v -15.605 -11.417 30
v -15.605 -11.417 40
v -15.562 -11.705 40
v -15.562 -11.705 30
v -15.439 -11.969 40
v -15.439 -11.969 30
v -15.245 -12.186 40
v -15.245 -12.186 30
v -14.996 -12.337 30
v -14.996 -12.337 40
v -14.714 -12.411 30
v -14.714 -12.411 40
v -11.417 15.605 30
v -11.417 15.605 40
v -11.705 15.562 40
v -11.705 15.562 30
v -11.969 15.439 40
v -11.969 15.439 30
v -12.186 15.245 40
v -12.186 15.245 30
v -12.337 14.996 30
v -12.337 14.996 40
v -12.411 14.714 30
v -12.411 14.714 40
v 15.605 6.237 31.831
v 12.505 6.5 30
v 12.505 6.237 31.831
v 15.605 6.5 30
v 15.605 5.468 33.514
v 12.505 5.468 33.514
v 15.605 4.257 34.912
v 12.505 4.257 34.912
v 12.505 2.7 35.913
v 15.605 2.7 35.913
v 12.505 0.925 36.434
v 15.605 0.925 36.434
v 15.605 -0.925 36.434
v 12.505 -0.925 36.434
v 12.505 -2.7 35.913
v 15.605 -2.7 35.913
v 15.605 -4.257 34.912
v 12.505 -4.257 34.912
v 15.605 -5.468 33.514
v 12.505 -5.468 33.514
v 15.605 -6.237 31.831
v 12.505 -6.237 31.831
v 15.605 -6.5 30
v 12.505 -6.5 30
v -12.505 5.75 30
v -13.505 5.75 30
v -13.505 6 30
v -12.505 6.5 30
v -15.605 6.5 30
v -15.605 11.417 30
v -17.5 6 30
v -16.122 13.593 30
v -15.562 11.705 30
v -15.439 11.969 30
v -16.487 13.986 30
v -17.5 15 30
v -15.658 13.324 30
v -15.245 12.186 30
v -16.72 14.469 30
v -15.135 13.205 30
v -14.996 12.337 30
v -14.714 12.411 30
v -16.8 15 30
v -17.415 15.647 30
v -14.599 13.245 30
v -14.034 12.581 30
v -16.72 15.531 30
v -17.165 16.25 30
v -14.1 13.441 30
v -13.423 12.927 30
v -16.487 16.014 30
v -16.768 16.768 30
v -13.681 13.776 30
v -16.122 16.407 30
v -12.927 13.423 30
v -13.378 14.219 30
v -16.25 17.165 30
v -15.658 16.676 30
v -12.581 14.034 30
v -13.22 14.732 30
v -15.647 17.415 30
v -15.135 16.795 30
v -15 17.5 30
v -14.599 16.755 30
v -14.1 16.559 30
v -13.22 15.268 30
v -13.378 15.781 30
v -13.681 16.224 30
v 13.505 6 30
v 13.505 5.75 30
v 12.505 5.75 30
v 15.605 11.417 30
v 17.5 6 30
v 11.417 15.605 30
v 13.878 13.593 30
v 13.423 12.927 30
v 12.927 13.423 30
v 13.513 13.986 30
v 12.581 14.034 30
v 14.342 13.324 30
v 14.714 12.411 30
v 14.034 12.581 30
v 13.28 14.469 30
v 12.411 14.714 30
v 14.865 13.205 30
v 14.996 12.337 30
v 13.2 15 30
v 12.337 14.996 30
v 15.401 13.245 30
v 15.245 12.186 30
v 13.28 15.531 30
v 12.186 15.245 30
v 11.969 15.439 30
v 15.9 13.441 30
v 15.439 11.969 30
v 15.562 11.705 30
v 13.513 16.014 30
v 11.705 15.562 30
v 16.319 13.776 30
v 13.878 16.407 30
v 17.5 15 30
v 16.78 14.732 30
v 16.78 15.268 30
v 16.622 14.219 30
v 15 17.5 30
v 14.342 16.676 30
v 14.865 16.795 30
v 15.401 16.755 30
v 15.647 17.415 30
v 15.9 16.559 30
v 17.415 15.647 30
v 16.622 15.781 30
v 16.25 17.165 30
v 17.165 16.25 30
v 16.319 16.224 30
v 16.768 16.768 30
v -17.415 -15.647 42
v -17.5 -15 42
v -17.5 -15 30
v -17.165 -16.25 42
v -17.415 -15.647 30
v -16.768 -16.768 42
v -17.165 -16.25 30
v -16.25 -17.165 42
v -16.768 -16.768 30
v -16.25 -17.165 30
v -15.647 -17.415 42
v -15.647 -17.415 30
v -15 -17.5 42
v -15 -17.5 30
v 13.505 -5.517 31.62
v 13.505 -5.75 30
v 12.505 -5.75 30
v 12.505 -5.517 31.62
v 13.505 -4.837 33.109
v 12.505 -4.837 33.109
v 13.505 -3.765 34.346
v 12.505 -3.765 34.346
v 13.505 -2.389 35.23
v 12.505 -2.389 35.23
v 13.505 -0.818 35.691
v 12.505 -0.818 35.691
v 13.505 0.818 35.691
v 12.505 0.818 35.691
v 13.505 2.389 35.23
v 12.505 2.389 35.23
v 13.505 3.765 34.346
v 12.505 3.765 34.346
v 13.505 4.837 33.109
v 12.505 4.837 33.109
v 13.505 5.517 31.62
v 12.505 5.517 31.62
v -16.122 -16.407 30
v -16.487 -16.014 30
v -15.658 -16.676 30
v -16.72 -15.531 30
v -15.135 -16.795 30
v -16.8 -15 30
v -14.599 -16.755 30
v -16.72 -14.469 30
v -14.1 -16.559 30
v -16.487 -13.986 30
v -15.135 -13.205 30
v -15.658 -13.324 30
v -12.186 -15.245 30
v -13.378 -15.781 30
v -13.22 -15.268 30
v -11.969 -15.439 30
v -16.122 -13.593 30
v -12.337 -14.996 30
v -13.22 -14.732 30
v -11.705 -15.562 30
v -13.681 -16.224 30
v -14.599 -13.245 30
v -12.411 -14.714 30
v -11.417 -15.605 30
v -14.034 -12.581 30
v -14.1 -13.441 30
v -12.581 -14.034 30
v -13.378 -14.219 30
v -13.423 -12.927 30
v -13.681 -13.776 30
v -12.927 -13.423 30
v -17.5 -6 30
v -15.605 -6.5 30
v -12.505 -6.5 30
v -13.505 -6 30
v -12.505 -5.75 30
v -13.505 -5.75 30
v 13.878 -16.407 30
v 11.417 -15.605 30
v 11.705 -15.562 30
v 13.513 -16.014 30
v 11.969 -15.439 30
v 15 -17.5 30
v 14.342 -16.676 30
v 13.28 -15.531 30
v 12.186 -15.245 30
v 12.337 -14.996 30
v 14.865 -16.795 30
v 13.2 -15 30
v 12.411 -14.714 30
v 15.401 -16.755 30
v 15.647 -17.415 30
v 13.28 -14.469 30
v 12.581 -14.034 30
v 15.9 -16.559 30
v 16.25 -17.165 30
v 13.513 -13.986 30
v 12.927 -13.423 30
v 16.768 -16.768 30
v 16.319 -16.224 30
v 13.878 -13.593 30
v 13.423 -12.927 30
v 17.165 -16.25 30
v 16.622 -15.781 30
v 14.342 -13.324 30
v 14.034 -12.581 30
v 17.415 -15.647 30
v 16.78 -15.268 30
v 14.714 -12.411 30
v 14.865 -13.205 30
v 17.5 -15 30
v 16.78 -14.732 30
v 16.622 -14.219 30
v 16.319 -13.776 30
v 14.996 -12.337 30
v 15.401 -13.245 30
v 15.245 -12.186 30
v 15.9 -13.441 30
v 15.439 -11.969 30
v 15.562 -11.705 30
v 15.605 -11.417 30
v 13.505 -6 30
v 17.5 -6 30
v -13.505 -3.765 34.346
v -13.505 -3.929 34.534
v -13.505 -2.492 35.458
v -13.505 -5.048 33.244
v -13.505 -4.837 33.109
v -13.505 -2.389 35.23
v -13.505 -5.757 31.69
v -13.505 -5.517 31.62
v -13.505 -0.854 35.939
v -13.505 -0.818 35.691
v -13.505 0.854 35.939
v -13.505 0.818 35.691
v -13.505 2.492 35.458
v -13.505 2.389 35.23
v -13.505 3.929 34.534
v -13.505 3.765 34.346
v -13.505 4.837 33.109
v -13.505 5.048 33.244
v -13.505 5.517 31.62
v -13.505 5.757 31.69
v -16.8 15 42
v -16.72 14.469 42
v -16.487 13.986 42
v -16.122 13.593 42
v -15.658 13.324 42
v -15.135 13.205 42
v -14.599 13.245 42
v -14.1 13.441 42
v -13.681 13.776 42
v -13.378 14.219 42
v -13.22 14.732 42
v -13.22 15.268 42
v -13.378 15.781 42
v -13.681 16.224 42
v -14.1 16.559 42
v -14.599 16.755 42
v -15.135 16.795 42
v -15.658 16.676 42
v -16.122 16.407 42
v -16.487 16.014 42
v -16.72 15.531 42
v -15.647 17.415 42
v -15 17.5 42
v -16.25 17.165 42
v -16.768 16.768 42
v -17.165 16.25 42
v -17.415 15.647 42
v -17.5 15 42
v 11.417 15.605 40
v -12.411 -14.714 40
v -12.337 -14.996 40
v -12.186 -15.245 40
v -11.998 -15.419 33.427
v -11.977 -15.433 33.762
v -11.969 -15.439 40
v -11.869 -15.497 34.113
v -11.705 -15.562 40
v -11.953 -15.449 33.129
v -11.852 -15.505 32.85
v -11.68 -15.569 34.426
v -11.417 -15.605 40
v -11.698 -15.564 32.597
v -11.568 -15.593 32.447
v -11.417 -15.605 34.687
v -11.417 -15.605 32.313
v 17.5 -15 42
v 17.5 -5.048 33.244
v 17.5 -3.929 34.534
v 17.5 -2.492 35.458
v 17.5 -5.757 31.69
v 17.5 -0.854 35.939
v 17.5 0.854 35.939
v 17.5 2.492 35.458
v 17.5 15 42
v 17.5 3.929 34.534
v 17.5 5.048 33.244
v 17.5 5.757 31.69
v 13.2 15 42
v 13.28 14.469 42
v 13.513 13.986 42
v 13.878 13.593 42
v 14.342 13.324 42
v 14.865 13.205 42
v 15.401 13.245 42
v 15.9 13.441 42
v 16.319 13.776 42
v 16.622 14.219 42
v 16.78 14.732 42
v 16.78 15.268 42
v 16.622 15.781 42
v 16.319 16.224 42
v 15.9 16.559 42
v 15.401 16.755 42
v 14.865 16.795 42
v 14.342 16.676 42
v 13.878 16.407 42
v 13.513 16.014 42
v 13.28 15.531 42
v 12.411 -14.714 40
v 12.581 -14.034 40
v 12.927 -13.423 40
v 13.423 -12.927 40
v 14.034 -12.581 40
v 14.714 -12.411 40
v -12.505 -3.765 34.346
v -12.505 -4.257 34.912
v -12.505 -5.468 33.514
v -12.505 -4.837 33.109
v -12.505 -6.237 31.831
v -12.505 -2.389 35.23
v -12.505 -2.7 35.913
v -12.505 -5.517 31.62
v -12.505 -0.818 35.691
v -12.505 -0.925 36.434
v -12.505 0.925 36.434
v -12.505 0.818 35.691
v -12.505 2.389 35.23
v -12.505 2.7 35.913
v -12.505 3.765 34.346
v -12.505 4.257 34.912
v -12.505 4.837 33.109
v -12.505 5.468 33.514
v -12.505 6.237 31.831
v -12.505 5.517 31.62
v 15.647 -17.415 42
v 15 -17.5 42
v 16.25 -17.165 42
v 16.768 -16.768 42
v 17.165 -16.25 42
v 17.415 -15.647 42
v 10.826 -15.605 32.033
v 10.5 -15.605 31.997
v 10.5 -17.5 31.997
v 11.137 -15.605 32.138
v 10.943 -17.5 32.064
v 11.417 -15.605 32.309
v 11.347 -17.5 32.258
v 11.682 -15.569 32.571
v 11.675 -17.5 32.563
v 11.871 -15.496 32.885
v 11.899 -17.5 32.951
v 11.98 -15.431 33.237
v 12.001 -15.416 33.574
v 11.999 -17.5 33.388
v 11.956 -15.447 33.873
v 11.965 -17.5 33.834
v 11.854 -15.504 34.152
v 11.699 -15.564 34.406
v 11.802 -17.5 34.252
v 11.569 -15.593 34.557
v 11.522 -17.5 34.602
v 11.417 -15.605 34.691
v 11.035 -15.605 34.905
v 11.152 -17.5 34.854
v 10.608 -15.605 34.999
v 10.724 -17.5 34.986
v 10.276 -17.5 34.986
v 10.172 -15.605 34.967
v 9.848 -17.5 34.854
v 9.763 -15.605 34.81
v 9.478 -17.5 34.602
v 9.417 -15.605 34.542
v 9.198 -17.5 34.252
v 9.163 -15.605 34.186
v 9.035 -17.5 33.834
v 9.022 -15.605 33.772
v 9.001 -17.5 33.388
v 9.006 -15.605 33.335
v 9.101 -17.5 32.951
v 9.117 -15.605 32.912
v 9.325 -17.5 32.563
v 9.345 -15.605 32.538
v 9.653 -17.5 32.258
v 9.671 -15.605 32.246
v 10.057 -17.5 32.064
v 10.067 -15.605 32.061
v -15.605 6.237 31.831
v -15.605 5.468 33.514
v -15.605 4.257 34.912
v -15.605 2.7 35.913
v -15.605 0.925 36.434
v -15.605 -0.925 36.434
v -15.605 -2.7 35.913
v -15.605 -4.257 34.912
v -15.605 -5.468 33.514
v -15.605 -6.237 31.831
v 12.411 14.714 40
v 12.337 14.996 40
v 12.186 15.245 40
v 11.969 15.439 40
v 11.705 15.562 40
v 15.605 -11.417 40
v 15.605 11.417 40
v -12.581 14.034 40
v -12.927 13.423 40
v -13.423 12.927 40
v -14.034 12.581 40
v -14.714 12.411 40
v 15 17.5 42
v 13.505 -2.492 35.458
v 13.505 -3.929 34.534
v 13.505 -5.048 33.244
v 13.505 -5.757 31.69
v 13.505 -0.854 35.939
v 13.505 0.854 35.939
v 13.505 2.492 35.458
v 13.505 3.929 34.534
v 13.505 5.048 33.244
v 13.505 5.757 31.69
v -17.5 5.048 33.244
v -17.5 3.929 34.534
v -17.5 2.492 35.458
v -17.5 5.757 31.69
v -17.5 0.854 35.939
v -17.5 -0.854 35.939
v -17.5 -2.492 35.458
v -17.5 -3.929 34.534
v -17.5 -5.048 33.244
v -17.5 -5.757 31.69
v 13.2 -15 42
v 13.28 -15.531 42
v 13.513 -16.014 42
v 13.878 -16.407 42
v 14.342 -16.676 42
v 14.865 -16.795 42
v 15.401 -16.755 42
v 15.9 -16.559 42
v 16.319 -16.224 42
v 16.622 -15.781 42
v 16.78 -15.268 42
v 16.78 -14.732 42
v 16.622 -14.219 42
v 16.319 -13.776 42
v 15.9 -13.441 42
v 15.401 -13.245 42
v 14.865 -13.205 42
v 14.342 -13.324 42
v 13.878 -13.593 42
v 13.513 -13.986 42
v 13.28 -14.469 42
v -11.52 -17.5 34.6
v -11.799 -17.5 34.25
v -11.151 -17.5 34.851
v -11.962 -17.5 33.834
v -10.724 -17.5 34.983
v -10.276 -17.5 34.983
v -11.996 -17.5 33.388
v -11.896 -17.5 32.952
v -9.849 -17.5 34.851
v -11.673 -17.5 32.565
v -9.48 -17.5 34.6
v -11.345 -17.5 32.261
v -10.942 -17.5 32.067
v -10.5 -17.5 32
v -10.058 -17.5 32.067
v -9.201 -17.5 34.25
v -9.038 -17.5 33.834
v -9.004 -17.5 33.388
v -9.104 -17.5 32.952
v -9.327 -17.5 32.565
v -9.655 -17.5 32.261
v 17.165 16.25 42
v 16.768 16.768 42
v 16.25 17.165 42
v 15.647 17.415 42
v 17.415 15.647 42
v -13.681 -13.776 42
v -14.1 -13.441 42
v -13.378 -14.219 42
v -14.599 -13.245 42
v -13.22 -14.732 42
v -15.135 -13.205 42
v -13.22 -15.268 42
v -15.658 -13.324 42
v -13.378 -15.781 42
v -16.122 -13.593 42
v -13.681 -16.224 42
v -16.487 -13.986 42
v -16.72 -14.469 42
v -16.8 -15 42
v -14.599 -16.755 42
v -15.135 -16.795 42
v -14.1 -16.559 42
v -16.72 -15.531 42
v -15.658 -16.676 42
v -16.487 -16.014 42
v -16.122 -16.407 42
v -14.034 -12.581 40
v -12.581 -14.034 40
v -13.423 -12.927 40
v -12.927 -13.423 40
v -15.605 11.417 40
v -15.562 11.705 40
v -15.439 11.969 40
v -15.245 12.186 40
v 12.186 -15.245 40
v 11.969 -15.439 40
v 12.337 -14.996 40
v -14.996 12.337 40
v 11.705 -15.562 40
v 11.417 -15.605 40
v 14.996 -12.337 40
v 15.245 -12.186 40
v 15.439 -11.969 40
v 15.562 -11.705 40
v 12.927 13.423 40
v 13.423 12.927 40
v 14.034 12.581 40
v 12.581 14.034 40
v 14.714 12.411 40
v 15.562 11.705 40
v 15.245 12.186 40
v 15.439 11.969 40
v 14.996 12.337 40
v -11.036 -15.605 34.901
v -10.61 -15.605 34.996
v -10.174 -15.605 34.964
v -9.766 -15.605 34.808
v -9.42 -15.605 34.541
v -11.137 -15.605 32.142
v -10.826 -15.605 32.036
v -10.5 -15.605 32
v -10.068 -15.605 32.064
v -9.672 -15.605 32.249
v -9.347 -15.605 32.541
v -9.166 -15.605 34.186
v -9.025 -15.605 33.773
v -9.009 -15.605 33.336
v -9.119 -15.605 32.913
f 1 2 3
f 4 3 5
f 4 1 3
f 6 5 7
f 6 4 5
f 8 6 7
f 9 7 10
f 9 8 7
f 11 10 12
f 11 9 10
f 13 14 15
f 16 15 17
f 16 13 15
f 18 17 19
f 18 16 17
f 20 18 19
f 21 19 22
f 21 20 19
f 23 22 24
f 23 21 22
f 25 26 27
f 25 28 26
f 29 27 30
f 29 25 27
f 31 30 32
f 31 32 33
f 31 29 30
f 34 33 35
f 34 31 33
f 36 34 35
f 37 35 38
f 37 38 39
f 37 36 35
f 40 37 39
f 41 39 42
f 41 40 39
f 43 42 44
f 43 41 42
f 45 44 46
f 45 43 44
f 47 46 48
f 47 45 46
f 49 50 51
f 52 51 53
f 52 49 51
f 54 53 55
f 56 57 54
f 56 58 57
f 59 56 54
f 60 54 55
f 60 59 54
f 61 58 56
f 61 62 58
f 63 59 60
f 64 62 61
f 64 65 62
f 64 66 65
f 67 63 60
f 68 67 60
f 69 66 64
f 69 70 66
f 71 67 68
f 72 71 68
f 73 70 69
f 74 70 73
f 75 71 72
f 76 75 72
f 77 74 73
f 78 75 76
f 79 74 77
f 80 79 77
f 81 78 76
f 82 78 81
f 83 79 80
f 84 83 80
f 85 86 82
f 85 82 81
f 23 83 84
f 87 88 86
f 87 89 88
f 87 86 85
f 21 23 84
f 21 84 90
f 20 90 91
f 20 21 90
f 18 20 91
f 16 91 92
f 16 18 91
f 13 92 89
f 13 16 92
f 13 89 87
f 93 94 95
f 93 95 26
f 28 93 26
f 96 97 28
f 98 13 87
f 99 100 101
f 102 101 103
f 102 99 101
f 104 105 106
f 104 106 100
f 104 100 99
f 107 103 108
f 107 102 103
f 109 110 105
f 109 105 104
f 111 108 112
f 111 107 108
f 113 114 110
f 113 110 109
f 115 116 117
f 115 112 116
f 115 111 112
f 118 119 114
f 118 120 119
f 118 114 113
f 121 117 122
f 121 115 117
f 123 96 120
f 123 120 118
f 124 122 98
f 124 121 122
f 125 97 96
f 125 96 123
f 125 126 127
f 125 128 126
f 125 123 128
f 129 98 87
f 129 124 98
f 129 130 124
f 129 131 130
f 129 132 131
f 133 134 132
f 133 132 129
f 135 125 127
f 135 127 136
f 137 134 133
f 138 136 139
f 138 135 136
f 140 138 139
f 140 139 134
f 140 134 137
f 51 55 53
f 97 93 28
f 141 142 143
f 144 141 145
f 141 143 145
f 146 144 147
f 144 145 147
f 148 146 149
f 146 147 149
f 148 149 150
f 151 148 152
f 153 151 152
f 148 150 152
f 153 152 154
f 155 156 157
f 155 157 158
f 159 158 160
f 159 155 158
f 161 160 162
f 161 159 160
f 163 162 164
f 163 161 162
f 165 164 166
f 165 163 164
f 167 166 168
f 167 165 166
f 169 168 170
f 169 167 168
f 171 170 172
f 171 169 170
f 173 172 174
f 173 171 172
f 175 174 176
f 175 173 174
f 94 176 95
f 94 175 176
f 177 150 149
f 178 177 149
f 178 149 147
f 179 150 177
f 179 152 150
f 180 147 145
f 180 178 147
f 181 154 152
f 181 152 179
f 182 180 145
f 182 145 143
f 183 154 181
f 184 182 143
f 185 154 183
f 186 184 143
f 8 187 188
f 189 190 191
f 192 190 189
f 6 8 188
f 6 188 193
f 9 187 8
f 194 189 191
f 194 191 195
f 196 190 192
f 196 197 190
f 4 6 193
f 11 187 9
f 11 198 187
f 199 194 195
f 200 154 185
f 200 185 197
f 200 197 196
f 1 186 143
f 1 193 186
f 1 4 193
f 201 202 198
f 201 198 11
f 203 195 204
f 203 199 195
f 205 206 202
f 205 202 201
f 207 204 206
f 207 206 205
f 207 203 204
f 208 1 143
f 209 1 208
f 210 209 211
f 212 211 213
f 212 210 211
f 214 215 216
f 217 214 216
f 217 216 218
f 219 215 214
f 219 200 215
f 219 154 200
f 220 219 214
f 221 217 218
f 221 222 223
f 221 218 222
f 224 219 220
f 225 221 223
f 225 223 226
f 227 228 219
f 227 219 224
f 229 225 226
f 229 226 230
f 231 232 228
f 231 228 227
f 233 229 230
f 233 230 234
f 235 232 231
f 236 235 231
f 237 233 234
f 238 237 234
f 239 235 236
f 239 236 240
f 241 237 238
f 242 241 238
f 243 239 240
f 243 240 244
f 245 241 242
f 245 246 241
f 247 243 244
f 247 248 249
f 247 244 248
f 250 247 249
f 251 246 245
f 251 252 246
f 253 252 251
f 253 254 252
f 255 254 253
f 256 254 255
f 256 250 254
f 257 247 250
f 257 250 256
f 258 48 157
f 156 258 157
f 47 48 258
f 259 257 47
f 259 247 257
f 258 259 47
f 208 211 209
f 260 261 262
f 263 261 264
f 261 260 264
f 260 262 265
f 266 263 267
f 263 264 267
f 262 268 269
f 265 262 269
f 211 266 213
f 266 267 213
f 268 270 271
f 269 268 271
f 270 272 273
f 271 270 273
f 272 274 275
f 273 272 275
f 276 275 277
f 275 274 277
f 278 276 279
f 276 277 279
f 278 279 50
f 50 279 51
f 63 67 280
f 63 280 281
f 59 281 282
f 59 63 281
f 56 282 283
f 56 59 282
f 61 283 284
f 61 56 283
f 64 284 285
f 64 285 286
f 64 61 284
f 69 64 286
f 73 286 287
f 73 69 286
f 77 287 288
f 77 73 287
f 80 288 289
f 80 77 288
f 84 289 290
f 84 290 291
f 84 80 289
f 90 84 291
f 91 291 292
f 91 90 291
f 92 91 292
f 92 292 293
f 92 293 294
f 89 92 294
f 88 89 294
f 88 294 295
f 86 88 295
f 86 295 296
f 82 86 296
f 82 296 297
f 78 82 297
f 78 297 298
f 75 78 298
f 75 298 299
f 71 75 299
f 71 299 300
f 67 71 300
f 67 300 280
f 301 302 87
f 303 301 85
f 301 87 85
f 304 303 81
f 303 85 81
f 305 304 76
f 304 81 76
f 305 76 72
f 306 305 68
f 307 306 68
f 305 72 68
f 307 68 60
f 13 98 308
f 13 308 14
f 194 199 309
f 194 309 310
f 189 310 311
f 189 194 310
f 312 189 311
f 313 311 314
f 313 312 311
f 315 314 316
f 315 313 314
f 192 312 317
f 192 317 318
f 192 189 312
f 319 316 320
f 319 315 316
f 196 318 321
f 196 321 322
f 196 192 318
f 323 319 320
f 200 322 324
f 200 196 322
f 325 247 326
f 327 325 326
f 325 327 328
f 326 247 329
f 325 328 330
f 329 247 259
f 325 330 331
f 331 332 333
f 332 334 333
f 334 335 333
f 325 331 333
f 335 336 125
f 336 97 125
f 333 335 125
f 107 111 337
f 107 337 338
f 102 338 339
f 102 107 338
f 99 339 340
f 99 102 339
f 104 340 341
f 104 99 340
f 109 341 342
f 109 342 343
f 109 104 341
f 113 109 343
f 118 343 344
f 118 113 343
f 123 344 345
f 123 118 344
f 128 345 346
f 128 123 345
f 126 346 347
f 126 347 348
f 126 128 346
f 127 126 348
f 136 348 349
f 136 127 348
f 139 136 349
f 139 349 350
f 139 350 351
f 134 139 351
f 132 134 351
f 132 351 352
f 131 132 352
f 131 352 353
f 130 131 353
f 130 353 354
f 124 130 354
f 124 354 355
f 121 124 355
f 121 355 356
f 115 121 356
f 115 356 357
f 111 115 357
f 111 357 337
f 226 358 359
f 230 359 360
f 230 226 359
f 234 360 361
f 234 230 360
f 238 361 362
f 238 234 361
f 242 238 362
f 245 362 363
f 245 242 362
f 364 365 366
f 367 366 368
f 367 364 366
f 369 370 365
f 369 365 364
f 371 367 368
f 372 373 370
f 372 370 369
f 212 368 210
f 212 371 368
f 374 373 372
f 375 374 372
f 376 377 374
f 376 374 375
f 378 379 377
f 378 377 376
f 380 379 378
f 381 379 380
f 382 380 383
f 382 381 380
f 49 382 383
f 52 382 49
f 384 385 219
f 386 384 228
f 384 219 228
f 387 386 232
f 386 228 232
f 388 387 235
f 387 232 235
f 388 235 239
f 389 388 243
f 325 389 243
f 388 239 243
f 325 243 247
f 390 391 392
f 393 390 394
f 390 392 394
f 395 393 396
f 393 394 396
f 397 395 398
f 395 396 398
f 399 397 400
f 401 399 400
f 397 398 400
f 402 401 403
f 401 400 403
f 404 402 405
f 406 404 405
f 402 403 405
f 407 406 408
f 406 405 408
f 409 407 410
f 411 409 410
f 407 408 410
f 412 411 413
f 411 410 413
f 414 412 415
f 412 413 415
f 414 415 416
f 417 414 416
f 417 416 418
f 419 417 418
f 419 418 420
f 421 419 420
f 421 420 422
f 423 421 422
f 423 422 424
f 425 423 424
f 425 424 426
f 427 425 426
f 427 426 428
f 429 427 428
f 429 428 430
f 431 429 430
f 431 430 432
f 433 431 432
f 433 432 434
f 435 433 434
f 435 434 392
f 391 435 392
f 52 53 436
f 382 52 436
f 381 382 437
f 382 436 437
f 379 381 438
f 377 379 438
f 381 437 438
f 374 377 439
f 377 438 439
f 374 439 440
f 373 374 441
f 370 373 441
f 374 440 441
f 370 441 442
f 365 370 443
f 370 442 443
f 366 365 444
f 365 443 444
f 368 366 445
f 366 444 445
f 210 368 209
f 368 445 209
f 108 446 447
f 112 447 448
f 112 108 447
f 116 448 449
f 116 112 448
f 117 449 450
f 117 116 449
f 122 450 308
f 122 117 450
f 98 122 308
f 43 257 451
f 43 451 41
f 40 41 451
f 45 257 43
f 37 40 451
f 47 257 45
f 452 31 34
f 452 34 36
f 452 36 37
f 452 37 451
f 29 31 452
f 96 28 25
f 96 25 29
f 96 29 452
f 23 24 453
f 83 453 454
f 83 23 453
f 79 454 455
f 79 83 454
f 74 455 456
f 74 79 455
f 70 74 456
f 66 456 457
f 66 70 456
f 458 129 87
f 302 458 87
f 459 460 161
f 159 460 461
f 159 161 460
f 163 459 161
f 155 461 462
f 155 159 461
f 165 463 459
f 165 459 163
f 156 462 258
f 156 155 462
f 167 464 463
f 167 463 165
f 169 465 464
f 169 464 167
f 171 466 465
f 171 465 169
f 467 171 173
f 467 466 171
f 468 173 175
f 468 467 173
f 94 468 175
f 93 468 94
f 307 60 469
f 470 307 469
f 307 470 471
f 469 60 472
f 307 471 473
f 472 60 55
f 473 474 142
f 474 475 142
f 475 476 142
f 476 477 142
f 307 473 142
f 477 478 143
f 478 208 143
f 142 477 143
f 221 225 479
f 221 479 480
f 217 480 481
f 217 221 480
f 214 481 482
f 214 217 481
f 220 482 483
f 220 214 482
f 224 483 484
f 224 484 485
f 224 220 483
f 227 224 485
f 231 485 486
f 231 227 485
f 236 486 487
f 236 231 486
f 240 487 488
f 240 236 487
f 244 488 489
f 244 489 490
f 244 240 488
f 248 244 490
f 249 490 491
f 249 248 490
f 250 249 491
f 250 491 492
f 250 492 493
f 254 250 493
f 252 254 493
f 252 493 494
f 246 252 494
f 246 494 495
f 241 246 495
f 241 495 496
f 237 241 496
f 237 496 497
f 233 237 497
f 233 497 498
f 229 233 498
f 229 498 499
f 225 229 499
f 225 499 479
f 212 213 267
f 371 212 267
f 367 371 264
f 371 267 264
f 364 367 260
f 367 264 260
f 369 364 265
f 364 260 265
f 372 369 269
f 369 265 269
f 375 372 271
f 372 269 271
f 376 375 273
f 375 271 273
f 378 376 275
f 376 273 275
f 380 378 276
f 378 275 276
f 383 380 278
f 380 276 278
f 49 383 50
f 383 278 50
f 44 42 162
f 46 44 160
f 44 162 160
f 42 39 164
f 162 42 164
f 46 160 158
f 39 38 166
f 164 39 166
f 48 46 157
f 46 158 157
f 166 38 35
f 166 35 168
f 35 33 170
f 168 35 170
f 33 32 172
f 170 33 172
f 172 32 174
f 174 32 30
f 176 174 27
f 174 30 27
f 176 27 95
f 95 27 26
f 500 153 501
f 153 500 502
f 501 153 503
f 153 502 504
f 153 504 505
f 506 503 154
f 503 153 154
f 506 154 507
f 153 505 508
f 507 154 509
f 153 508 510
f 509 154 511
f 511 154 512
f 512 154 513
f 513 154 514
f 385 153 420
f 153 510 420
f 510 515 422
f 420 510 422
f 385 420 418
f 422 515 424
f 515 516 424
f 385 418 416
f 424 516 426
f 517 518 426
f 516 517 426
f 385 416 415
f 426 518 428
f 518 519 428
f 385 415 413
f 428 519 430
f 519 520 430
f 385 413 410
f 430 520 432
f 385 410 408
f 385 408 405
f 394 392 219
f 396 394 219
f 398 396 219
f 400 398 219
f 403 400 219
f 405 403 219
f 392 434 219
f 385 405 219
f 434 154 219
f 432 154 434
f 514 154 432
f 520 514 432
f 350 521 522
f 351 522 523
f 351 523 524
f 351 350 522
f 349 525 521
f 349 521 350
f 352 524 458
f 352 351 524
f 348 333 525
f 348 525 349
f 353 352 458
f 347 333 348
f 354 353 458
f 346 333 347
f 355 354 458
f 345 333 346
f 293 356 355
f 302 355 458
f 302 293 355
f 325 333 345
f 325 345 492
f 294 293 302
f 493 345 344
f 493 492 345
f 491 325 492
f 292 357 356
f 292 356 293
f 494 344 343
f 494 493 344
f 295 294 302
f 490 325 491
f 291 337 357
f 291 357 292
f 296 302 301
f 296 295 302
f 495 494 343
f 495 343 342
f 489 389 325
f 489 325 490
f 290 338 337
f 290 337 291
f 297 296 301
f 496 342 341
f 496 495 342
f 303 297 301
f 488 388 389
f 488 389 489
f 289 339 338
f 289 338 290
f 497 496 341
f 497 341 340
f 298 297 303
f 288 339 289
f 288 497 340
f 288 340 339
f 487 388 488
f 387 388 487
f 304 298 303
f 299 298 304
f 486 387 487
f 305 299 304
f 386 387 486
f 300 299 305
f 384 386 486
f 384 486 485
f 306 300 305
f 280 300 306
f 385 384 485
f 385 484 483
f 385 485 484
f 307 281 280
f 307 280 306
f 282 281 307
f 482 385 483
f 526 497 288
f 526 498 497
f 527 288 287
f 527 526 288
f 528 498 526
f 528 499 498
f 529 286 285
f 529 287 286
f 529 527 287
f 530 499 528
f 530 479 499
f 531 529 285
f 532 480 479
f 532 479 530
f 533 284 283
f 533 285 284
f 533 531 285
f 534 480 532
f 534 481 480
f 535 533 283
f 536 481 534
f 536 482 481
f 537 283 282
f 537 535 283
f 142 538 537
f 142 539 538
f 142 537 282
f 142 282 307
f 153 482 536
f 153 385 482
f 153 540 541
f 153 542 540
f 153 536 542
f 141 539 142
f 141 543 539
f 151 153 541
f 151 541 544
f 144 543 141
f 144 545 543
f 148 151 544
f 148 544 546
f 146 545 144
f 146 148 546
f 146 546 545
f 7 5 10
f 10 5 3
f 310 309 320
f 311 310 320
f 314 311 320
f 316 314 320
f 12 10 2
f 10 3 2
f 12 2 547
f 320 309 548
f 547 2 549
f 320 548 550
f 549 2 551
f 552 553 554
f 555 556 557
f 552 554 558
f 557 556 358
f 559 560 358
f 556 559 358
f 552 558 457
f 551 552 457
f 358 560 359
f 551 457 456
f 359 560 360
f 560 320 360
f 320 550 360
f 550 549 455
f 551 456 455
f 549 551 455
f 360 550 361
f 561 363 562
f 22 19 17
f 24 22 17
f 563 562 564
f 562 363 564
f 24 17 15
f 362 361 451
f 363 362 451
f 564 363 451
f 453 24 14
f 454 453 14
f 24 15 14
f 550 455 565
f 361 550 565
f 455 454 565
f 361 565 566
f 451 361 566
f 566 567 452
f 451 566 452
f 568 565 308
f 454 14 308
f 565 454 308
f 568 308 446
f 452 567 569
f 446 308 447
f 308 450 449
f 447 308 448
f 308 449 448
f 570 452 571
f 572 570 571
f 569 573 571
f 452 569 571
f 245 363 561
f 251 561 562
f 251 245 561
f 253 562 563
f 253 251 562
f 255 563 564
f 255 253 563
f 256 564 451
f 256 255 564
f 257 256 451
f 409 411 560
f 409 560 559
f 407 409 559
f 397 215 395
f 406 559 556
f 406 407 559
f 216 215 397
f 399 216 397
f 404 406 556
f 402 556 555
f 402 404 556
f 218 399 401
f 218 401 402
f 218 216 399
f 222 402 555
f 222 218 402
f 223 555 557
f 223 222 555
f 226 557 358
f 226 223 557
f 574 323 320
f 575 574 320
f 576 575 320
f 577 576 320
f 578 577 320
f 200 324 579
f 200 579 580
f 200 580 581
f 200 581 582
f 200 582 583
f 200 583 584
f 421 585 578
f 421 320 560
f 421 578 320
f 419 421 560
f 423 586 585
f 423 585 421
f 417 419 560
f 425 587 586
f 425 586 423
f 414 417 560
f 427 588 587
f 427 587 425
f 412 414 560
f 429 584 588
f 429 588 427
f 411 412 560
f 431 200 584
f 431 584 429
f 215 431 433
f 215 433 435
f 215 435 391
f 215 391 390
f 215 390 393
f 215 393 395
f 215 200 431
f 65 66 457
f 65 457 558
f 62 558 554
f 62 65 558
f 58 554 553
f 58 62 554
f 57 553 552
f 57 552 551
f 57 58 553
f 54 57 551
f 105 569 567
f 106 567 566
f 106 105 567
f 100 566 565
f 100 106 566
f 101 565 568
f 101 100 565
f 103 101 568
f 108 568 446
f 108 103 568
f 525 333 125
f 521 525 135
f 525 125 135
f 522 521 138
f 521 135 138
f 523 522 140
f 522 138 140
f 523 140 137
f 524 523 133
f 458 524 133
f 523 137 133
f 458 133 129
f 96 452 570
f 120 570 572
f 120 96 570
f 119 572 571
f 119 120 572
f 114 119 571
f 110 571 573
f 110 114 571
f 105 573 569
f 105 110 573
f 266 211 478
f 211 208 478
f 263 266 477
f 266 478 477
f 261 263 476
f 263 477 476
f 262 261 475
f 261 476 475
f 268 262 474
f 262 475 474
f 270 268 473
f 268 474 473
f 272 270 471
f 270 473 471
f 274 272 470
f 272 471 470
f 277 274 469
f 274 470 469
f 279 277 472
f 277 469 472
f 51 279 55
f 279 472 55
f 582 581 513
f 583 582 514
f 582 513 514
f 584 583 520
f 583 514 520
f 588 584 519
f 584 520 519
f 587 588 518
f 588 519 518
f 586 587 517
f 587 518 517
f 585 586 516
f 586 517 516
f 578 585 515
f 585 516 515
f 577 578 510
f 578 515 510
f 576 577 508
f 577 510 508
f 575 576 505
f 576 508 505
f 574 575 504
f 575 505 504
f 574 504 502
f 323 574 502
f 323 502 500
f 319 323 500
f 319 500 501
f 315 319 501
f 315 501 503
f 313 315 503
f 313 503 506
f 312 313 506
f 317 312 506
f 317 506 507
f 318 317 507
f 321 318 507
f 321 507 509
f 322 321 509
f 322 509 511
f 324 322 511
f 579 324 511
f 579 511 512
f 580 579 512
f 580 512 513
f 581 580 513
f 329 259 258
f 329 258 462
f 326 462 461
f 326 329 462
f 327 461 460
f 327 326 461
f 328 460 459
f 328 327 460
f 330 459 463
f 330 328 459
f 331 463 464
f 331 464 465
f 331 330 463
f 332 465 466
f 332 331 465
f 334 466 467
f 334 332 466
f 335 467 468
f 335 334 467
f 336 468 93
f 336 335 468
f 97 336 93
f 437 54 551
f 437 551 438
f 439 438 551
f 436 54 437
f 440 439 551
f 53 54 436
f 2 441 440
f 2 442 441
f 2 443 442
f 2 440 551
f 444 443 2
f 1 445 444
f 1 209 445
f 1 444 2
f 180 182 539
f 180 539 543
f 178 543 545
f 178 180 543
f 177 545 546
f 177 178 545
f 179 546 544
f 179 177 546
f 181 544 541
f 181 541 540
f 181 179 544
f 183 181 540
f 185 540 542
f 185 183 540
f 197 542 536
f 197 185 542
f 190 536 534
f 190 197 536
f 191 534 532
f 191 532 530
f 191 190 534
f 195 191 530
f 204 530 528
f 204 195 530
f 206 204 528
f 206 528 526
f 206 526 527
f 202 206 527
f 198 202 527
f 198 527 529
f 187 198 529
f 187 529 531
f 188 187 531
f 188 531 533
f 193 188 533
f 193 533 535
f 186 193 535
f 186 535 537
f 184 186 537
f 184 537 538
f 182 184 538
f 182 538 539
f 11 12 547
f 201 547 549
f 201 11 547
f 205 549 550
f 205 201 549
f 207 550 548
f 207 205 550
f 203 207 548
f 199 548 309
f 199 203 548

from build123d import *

# Parameters (mm, degrees)
SKETCH_1_R          = 1.8
EXTRUDE_1_DEPTH     = 42
SKETCH_2_R          = 6
CUT_EXTRUDE_1_DEPTH = 58.404268134
SKETCH_3_R          = 6
CUT_EXTRUDE_2_DEPTH = 58.404268134
CUT_EXTRUDE_3_DEPTH = 58.404268134
EXTRUDE_2_DEPTH     = 2.1
EXTRUDE_3_DEPTH     = 1
EXTRUDE_START       = -2
EXTRUDE_4_DEPTH     = 2
SKETCH_8_R          = 1.503070462
SKETCH_8_R_2        = 1.5
CUT_EXTRUDE_4_DEPTH = 3


with BuildPart() as part:
    # 草图1 → 凸台-拉伸1 (new body)
    with BuildSketch(Plane(origin=(0, 0, 0), x_dir=(-1, 0, 0), z_dir=(0, 0, 1))):
        with BuildLine():
            Line((-17.5, 15), (-17.5, -15))
            ThreePointArc((-17.5, -15), (-16.767766953, -16.767766953), (-15, -17.5))
            Line((-15, -17.5), (15, -17.5))
            ThreePointArc((15, -17.5), (16.767766953, -16.767766953), (17.5, -15))
            Line((17.5, -15), (17.5, 15))
            ThreePointArc((17.5, 15), (16.767766953, 16.767766953), (15, 17.5))
            Line((15, 17.5), (-15, 17.5))
            ThreePointArc((-15, 17.5), (-16.767766953, 16.767766953), (-17.5, 15))
        make_face()
        with Locations((-15, -15)):
            Circle(SKETCH_1_R, mode=Mode.SUBTRACT)
        with Locations((15, -15)):
            Circle(SKETCH_1_R, mode=Mode.SUBTRACT)
        with Locations((15, 15)):
            Circle(SKETCH_1_R, mode=Mode.SUBTRACT)
        with Locations((-15, 15)):
            Circle(SKETCH_1_R, mode=Mode.SUBTRACT)
        with BuildLine():
            Line((15.604722414, -11.417049415), (15.604722414, 11.417049415))
            ThreePointArc((15.604722414, 11.417049415), (15.349600754, 12.084241863), (14.71440494, 12.410981979))
            ThreePointArc((14.71440494, 12.410981979), (13.158183899, 13.158182338), (12.410982221, 14.714402746))
            ThreePointArc((12.410982221, 14.714402746), (12.084242685, 15.349600017), (11.417049415, 15.604722414))
            Line((11.417049415, 15.604722414), (-11.417049415, 15.604722414))
            ThreePointArc((-11.417049415, 15.604722414), (-12.084241863, 15.349600754), (-12.410981979, 14.71440494))
            ThreePointArc((-12.410981979, 14.71440494), (-13.158182338, 13.158183899), (-14.714402746, 12.410982221))
            ThreePointArc((-14.714402746, 12.410982221), (-15.349600017, 12.084242685), (-15.604722413, 11.417049415))
            Line((-15.604722413, 11.417049415), (-15.604722413, -11.417049415))
            ThreePointArc((-15.604722413, -11.417049415), (-15.349600754, -12.084241863), (-14.71440494, -12.410981979))
            ThreePointArc((-14.71440494, -12.410981979), (-13.158183899, -13.158182338), (-12.410982221, -14.714402746))
            ThreePointArc((-12.410982221, -14.714402746), (-12.084242685, -15.349600017), (-11.417049415, -15.604722413))
            Line((-11.417049415, -15.604722413), (11.417049415, -15.604722413))
            ThreePointArc((11.417049415, -15.604722413), (12.084241863, -15.349600754), (12.410981979, -14.71440494))
            ThreePointArc((12.410981979, -14.71440494), (13.158182338, -13.158183899), (14.714402746, -12.410982221))
            ThreePointArc((14.714402746, -12.410982221), (15.349600017, -12.084242685), (15.604722414, -11.417049415))
        make_face(mode=Mode.SUBTRACT)
    extrude(amount=EXTRUDE_1_DEPTH)

    # 草图2 → 切除-拉伸1 (cut, through all)
    with BuildSketch(Plane(origin=(0, 17.5, 0), x_dir=(1, 0, 0), z_dir=(0, 1, 0))):
        with Locations(Location((0, -12, 0), (0, 0, 270))):
            Circle(SKETCH_2_R)
    extrude(amount=-CUT_EXTRUDE_1_DEPTH, mode=Mode.SUBTRACT)

    # 草图3 → 切除-拉伸2 (cut, through all)
    with BuildSketch(Plane.ZY.offset(17.5)):
        with Locations((30, 0)):
            Circle(SKETCH_3_R)
    extrude(amount=-CUT_EXTRUDE_2_DEPTH, mode=Mode.SUBTRACT)

    # 草图4 → 切除-拉伸3 (cut, through all)
    with BuildSketch(Plane(origin=(17.5, 0, 0), x_dir=(0, 0, -1), z_dir=(1, 0, 0))):
        Polygon((-30, 6), (-30, -18.57864904), (7.937077404, -18.57864904), (5.133649544, 19.10132203), (-30, 19.10132203), align=None)
    extrude(amount=-CUT_EXTRUDE_3_DEPTH, mode=Mode.SUBTRACT)

    # 草图5 → 凸台-拉伸2 (add)
    with BuildSketch(Plane(origin=(-15.604722414, 0, 0), x_dir=(0, 0, -1), z_dir=(1, 0, 0))):
        with BuildLine():
            Line((-30, -6.5), (-30, -6))
            ThreePointArc((-30, -6), (-36, 0), (-30, 6))
            Line((-30, 6), (-30, 6.5))
            ThreePointArc((-30, 6.5), (-36.5, 0), (-30, -6.5))
        make_face()
    extrude_2 = extrude(amount=EXTRUDE_2_DEPTH)

    # 草图6 → 凸台-拉伸3 (add)
    with BuildSketch(Plane(origin=(-13.504722414, 0, 0), x_dir=(0, 0, -1), z_dir=(1, 0, 0))):
        with BuildLine():
            Line((-30, -6.5), (-30, -5.75))
            ThreePointArc((-30, -5.75), (-35.75, 0), (-30, 5.75))
            Line((-30, 5.75), (-30, 6.5))
            ThreePointArc((-30, 6.5), (-36.5, 0), (-30, -6.5))
        make_face()
    extrude_3 = extrude(amount=EXTRUDE_3_DEPTH)

    # 镜向1: 凸台-拉伸2, 凸台-拉伸3 across plane
    add(extrude_2.mirror(Plane(origin=(0, 0, 0), x_dir=(0, 0, 1), z_dir=(1, 0, 0))))
    add(extrude_3.mirror(Plane(origin=(0, 0, 0), x_dir=(0, 0, 1), z_dir=(1, 0, 0))))

    # 草图7 → 凸台-拉伸4 (add)
    with BuildSketch(Plane.XY.offset(42).offset(EXTRUDE_START)):
        with BuildLine():
            Line((-15.604722414, 11.417049415), (-15.604722414, -11.417049415))
            ThreePointArc((-15.604722414, -11.417049415), (-15.349600754, -12.084241863), (-14.71440494, -12.410981979))
            ThreePointArc((-14.71440494, -12.410981979), (-13.158183899, -13.158182338), (-12.410982221, -14.714402746))
            ThreePointArc((-12.410982221, -14.714402746), (-12.084242685, -15.349600017), (-11.417049415, -15.604722414))
            Line((-11.417049415, -15.604722414), (11.417049415, -15.604722414))
            ThreePointArc((11.417049415, -15.604722414), (12.084241863, -15.349600754), (12.410981979, -14.71440494))
            ThreePointArc((12.410981979, -14.71440494), (13.158182338, -13.158183899), (14.714402746, -12.410982221))
            ThreePointArc((14.714402746, -12.410982221), (15.349600017, -12.084242685), (15.604722413, -11.417049415))
            Line((15.604722413, -11.417049415), (15.604722413, 11.417049415))
            ThreePointArc((15.604722413, 11.417049415), (15.349600754, 12.084241863), (14.71440494, 12.410981979))
            ThreePointArc((14.71440494, 12.410981979), (13.158183899, 13.158182338), (12.410982221, 14.714402746))
            ThreePointArc((12.410982221, 14.714402746), (12.084242685, 15.349600017), (11.417049415, 15.604722413))
            Line((11.417049415, 15.604722413), (-11.417049415, 15.604722413))
            ThreePointArc((-11.417049415, 15.604722413), (-12.084241863, 15.349600754), (-12.410981979, 14.71440494))
            ThreePointArc((-12.410981979, 14.71440494), (-13.158182338, 13.158183899), (-14.714402746, 12.410982221))
            ThreePointArc((-14.714402746, 12.410982221), (-15.349600017, 12.084242685), (-15.604722414, 11.417049415))
        make_face()
    extrude(amount=EXTRUDE_4_DEPTH)

    # 草图8 → 切除-拉伸4 (cut)
    with BuildSketch(Plane.XZ.offset(17.5)):
        with Locations(Location((10.499999996, 33.500000027, 0), (0, 0, 270))):
            Circle(SKETCH_8_R)
        with Locations(Location((-10.500000004, 33.500000024, 0), (0, 0, 270))):
            Circle(SKETCH_8_R_2)
    extrude(amount=-CUT_EXTRUDE_4_DEPTH, mode=Mode.SUBTRACT)


solid = part.part
